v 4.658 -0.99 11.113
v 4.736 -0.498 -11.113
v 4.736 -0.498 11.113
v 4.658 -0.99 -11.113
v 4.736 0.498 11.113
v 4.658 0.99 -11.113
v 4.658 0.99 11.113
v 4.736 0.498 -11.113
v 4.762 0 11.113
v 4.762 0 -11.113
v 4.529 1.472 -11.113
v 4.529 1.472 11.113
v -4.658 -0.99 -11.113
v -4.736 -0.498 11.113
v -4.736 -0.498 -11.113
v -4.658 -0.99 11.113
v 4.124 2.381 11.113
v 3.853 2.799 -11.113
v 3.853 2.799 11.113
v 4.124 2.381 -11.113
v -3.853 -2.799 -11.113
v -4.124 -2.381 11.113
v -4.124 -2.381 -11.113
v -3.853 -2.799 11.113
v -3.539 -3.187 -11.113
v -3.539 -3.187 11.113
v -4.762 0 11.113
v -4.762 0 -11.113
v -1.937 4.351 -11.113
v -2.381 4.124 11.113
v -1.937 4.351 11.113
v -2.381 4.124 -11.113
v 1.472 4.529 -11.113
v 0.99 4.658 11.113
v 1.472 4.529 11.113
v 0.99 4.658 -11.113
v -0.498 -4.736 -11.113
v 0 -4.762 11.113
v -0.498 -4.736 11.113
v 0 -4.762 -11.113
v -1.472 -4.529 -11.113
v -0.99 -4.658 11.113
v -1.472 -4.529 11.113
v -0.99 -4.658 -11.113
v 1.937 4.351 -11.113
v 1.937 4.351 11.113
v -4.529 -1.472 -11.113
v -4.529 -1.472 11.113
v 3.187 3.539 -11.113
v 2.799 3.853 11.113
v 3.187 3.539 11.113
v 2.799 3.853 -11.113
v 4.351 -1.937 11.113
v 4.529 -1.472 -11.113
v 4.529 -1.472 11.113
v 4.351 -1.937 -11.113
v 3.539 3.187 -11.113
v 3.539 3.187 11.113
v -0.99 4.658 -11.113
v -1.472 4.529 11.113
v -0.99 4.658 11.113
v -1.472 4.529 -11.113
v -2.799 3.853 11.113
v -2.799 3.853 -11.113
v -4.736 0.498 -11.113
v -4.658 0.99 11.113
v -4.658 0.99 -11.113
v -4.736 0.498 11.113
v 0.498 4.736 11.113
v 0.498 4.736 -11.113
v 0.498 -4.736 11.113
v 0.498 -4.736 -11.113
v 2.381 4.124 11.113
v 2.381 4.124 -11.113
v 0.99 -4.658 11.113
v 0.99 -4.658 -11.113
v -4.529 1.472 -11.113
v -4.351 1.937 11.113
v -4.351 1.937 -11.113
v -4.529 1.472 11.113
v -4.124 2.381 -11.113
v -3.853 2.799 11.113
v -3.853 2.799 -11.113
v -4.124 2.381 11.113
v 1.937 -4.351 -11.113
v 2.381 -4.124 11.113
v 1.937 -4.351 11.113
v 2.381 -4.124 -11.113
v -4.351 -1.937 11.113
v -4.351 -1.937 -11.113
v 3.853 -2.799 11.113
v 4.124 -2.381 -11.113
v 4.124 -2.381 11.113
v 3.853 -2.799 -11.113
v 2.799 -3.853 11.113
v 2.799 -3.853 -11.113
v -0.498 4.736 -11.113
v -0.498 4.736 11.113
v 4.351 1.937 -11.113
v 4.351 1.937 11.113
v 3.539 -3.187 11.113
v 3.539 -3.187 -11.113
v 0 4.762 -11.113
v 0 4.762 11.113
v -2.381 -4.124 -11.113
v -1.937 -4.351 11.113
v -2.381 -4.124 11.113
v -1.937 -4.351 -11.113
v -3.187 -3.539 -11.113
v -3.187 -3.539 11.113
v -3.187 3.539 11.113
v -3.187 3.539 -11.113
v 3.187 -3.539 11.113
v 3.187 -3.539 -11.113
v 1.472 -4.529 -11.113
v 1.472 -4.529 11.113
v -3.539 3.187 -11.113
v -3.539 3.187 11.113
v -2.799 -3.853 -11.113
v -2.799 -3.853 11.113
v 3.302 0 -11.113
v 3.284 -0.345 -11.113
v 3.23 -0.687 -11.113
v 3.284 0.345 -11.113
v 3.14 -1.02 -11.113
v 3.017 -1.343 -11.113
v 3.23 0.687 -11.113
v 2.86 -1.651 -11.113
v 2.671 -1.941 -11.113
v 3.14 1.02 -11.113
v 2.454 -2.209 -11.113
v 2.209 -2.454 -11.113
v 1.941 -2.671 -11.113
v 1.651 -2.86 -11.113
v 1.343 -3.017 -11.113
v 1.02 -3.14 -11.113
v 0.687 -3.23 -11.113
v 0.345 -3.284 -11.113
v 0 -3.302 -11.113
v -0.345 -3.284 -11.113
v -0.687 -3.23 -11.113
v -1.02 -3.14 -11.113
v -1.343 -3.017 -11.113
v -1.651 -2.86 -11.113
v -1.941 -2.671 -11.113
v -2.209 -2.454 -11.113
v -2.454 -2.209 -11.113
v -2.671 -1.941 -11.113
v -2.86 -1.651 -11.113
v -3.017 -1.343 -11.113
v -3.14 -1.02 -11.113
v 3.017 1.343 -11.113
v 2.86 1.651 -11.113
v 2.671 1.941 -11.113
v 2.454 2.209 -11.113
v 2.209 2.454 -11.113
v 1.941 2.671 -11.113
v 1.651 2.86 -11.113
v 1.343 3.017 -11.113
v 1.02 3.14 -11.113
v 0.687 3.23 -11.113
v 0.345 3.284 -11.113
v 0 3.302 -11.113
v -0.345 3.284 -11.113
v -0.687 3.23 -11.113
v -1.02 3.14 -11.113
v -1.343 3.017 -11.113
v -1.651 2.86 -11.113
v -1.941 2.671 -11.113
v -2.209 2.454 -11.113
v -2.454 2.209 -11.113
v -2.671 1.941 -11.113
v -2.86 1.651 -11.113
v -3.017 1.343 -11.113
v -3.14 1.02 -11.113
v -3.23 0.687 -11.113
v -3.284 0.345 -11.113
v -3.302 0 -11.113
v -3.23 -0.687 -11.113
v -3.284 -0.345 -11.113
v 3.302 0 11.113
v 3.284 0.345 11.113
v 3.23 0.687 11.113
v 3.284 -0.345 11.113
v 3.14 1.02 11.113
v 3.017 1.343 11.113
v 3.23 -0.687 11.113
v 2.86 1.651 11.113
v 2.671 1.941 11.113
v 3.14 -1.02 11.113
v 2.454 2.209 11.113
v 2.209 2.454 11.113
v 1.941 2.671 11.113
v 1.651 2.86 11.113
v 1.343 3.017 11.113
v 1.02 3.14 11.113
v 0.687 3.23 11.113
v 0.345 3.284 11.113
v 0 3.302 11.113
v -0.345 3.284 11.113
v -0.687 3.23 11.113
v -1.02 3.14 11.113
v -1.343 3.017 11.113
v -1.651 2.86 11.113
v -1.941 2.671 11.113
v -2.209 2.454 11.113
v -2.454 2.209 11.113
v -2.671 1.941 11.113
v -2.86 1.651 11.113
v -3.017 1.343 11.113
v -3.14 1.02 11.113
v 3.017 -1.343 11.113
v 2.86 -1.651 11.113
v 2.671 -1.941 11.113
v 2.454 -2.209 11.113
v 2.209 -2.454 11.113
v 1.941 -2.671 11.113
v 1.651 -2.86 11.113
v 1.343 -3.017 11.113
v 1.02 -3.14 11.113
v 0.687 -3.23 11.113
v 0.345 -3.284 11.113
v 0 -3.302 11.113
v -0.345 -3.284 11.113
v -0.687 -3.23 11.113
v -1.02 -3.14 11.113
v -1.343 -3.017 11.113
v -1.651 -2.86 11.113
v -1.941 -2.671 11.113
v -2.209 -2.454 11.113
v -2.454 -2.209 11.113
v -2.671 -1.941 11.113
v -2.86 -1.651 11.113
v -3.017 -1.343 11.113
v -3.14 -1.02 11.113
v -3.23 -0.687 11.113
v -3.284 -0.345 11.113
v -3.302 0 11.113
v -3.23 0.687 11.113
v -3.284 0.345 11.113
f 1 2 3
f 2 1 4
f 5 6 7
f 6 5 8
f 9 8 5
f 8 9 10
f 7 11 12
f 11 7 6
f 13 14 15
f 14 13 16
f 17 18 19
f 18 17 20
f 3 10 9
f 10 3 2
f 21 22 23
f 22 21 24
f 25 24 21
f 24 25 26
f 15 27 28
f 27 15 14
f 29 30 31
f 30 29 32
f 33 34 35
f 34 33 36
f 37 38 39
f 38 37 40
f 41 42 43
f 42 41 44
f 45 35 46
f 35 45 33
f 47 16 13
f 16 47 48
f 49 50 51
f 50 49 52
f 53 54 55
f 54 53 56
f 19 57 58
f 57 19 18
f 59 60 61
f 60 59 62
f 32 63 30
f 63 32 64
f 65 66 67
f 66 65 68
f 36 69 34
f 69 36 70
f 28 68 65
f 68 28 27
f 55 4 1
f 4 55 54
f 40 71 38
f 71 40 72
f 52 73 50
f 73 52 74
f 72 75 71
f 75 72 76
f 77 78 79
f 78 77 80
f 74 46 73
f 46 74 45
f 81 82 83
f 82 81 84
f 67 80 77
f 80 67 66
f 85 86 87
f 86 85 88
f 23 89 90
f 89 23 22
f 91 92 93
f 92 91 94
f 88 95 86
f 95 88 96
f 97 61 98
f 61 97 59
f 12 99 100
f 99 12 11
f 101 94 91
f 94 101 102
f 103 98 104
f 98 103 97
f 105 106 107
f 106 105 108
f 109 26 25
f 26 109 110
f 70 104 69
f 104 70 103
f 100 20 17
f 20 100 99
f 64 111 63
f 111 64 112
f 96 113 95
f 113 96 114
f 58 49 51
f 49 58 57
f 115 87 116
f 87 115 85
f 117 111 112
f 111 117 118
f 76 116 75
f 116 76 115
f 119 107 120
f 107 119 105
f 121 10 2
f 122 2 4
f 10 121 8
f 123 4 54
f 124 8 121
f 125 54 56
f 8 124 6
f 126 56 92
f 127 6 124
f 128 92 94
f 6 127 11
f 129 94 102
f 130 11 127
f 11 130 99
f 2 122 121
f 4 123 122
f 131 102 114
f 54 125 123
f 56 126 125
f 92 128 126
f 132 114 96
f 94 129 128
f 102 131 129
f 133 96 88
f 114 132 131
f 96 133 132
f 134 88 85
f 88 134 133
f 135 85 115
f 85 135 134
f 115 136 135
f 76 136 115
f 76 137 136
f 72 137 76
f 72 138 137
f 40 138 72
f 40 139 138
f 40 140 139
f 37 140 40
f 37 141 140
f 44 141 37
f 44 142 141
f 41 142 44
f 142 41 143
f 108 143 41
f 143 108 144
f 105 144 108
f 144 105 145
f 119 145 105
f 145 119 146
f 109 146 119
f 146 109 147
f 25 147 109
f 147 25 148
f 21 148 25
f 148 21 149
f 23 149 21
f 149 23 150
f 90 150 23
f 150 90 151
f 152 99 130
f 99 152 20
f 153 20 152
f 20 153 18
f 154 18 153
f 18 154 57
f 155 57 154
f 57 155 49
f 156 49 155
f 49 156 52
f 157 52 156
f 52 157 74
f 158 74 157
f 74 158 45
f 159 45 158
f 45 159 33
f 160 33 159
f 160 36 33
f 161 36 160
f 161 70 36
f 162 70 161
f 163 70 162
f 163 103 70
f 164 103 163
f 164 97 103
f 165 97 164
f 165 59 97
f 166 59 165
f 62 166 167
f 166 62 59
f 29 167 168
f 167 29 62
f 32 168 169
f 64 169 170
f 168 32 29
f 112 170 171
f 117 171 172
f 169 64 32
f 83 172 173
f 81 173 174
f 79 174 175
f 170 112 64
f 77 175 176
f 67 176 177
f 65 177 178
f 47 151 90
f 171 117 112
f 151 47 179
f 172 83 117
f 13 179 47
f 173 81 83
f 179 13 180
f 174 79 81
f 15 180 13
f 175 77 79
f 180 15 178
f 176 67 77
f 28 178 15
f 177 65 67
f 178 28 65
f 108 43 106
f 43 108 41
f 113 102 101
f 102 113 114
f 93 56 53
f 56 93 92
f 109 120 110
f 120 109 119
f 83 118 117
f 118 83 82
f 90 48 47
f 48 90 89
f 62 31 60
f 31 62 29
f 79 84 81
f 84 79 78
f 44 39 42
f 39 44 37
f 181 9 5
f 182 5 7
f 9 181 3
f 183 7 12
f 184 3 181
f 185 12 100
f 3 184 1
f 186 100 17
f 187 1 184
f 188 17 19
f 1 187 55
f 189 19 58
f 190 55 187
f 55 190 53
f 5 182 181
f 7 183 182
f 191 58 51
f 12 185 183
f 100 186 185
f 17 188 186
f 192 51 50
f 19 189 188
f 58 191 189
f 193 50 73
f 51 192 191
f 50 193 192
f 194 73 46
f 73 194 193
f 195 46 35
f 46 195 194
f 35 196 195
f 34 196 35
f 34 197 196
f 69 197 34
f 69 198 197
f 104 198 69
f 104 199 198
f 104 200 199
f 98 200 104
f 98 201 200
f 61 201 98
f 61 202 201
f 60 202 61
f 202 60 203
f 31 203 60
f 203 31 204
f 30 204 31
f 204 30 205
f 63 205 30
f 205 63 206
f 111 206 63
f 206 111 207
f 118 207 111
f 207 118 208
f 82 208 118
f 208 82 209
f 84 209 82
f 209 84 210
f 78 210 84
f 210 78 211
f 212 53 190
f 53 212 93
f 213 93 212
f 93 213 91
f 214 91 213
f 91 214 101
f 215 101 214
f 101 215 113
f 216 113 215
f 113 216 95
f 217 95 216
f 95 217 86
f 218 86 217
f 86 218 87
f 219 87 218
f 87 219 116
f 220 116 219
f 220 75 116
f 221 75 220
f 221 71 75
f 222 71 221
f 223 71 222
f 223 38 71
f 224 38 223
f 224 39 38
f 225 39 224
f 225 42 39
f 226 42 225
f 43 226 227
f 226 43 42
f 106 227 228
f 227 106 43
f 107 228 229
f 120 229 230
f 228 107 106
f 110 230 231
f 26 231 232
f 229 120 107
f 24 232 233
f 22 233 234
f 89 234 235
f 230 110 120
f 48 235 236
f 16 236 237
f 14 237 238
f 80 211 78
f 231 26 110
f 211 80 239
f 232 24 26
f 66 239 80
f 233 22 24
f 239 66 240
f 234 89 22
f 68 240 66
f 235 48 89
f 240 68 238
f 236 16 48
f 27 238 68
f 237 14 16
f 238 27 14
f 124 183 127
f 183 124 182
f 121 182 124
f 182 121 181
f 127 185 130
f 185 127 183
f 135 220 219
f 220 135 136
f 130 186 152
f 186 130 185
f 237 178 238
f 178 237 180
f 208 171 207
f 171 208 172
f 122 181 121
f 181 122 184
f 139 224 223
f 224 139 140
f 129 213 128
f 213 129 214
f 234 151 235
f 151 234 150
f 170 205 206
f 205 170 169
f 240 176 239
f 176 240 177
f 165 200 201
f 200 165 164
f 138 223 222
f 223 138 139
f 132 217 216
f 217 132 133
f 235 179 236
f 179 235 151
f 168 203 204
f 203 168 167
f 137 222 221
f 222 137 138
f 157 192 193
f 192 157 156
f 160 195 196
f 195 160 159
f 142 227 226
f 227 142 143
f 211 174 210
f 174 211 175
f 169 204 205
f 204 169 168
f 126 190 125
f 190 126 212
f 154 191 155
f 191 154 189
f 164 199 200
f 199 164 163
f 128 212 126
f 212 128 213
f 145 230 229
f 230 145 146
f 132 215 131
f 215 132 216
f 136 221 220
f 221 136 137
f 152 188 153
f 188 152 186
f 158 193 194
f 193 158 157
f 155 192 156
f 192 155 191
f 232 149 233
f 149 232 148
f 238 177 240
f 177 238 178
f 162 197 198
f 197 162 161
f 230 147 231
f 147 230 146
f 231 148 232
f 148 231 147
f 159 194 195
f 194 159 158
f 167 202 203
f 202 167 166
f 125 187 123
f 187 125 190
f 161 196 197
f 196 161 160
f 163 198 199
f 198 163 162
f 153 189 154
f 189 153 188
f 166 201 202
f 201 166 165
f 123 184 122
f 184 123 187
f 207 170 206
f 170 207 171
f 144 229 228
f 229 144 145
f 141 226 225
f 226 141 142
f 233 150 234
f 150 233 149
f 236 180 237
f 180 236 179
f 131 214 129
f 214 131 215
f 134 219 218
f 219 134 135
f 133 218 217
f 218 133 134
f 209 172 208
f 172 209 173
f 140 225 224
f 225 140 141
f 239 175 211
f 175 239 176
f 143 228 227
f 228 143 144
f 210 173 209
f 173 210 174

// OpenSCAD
switchx=3.25;
switchy=5;
switchthick=.125;
screwdist=2.375;
recessdepth=1/16;

boltdia=.26;

slotx=.25;
slotz=.375;

slotlength=1.5;

res=60;


module finalplate(){
module plate(){
difference(){
    cube([switchx,switchy,switchthick], center=true);
    cube([.5, 1, switchthick], center=true);
    translate ([0,screwdist/2,recessdepth/2]) cylinder(d1=.125, d2=.375, h=switchthick-recessdepth, center=true, $fn=res);
    translate ([0,-screwdist/2,recessdepth/2]) cylinder(d1=.125, d2=.375, h=switchthick-recessdepth, center=true, $fn=res);
}
}

module recess(){
    cube ([1.5,4,recessdepth], center=true);
}

difference(){
plate();
  translate([0,0,-recessdepth/2])  recess();
}

module slotrails(){
translate ([switchx/2-slotx/2, 0, slotz/2+switchthick/2]) cube([slotx,slotlength+.5,slotz], center=true);
translate ([-(switchx/2-slotx/2), 0, slotz/2+switchthick/2]) cube([slotx,slotlength+.5,slotz], center=true);
}

module pivot(){
    translate ([switchx/2-slotx/2, switchy/2-(boltdia+.5)/2, slotz/2+switchthick/2]) cube([slotx, boltdia+.5, slotz], center=true);
    translate ([-(switchx/2-slotx/2), switchy/2-(boltdia+.5)/2, slotz/2+switchthick/2]) cube([slotx, boltdia+.5, slotz], center=true);
    }
difference(){    
    pivot();
    translate ([0, switchy/2-(boltdia+.5)/2, slotz/2+switchthick/2]) rotate([0,90,0]) cylinder(d=boltdia, h=switchx, $fn=res, center=true);
}

difference(){
    slotrails();
    hull(){
        translate([0,slotlength/2, slotz/2+switchthick/2]) rotate([0,90,0]) cylinder(d=boltdia, h=switchx, $fn=res, center=true);
         translate([0,-slotlength/2, slotz/2+switchthick/2]) rotate([0,90,0]) cylinder(d=boltdia, h=switchx, $fn=res, center=true);
    }
}
}

//scale([25.4,25.4,25.4]) finalplate();

//LINKAGE AND WASHERS -- PRINT 4 @ linklength=.75 AND 2 DETERMINE LONGER LENGTH//

linkagez=.125;
linklength=2.5;

module linkswitch(){
    difference(){
    hull(){
        cylinder(h=linkagez, d=slotz, $fn=res);
        translate([0,linklength,0]) cylinder(h=linkagez, d=slotz, $fn=res);
        
    }
    cylinder(h=linkagez, d=boltdia, $fn=res);
    translate([0,linklength,0]) cylinder(h=linkagez, d=boltdia, $fn=res);
    
}
}

//scale([25.4,25.4,25.4]) linkswitch();

///HINGE -- PRINT 2 OF THESE
hingewidth=1;

module hinge(){
    difference(){
    hull(){
        translate([0,hingewidth/2,0]) cylinder(h=hingewidth, d=slotz, $fn=res, center=true);
        translate([hingewidth/2,hingewidth,0]) cylinder(h=hingewidth, d=slotz, $fn=res, center=true);
        translate([-hingewidth/2,hingewidth,0]) cylinder(h=hingewidth, d=slotz, $fn=res, center=true);
    }
    translate([0,hingewidth/2,0]) cylinder(h=hingewidth, d=boltdia, $fn=res, center=true);
    cube([hingewidth+hingewidth/2,hingewidth+hingewidth/2,hingewidth/2], center=true);
    translate([3*hingewidth/8,0,0]) rotate([90,90,0]) cylinder(d=.13, h=2.5*hingewidth, $fn=res, center=true);
    translate([3*hingewidth/8,0,0]) rotate([90,90,0]) cylinder(d=.375, h=1.75*hingewidth, $fn=res, center=true);
       translate([-3*hingewidth/8,0,0]) rotate([90,90,0]) cylinder(d=.13, h=2.5*hingewidth, $fn=res, center=true);
    translate([-3*hingewidth/8,0,0]) rotate([90,90,0]) cylinder(d=.375, h=1.75*hingewidth, $fn=res, center=true);
}
}


//scale([25.4,25.4,25.4]) hinge();


//spacer for top pivot point -- PRINT 2 OF THESE    
module spacer(){
    difference(){
        cylinder(h=(switchx-2*slotx-hingewidth)/2, d=slotz, center=true, $fn=res);
        cylinder(h=(switchx-2*slotx-hingewidth)/2, d=boltdia, center=true, $fn=res);
    }
}

scale([25.4,25.4,25.4]) spacer();
